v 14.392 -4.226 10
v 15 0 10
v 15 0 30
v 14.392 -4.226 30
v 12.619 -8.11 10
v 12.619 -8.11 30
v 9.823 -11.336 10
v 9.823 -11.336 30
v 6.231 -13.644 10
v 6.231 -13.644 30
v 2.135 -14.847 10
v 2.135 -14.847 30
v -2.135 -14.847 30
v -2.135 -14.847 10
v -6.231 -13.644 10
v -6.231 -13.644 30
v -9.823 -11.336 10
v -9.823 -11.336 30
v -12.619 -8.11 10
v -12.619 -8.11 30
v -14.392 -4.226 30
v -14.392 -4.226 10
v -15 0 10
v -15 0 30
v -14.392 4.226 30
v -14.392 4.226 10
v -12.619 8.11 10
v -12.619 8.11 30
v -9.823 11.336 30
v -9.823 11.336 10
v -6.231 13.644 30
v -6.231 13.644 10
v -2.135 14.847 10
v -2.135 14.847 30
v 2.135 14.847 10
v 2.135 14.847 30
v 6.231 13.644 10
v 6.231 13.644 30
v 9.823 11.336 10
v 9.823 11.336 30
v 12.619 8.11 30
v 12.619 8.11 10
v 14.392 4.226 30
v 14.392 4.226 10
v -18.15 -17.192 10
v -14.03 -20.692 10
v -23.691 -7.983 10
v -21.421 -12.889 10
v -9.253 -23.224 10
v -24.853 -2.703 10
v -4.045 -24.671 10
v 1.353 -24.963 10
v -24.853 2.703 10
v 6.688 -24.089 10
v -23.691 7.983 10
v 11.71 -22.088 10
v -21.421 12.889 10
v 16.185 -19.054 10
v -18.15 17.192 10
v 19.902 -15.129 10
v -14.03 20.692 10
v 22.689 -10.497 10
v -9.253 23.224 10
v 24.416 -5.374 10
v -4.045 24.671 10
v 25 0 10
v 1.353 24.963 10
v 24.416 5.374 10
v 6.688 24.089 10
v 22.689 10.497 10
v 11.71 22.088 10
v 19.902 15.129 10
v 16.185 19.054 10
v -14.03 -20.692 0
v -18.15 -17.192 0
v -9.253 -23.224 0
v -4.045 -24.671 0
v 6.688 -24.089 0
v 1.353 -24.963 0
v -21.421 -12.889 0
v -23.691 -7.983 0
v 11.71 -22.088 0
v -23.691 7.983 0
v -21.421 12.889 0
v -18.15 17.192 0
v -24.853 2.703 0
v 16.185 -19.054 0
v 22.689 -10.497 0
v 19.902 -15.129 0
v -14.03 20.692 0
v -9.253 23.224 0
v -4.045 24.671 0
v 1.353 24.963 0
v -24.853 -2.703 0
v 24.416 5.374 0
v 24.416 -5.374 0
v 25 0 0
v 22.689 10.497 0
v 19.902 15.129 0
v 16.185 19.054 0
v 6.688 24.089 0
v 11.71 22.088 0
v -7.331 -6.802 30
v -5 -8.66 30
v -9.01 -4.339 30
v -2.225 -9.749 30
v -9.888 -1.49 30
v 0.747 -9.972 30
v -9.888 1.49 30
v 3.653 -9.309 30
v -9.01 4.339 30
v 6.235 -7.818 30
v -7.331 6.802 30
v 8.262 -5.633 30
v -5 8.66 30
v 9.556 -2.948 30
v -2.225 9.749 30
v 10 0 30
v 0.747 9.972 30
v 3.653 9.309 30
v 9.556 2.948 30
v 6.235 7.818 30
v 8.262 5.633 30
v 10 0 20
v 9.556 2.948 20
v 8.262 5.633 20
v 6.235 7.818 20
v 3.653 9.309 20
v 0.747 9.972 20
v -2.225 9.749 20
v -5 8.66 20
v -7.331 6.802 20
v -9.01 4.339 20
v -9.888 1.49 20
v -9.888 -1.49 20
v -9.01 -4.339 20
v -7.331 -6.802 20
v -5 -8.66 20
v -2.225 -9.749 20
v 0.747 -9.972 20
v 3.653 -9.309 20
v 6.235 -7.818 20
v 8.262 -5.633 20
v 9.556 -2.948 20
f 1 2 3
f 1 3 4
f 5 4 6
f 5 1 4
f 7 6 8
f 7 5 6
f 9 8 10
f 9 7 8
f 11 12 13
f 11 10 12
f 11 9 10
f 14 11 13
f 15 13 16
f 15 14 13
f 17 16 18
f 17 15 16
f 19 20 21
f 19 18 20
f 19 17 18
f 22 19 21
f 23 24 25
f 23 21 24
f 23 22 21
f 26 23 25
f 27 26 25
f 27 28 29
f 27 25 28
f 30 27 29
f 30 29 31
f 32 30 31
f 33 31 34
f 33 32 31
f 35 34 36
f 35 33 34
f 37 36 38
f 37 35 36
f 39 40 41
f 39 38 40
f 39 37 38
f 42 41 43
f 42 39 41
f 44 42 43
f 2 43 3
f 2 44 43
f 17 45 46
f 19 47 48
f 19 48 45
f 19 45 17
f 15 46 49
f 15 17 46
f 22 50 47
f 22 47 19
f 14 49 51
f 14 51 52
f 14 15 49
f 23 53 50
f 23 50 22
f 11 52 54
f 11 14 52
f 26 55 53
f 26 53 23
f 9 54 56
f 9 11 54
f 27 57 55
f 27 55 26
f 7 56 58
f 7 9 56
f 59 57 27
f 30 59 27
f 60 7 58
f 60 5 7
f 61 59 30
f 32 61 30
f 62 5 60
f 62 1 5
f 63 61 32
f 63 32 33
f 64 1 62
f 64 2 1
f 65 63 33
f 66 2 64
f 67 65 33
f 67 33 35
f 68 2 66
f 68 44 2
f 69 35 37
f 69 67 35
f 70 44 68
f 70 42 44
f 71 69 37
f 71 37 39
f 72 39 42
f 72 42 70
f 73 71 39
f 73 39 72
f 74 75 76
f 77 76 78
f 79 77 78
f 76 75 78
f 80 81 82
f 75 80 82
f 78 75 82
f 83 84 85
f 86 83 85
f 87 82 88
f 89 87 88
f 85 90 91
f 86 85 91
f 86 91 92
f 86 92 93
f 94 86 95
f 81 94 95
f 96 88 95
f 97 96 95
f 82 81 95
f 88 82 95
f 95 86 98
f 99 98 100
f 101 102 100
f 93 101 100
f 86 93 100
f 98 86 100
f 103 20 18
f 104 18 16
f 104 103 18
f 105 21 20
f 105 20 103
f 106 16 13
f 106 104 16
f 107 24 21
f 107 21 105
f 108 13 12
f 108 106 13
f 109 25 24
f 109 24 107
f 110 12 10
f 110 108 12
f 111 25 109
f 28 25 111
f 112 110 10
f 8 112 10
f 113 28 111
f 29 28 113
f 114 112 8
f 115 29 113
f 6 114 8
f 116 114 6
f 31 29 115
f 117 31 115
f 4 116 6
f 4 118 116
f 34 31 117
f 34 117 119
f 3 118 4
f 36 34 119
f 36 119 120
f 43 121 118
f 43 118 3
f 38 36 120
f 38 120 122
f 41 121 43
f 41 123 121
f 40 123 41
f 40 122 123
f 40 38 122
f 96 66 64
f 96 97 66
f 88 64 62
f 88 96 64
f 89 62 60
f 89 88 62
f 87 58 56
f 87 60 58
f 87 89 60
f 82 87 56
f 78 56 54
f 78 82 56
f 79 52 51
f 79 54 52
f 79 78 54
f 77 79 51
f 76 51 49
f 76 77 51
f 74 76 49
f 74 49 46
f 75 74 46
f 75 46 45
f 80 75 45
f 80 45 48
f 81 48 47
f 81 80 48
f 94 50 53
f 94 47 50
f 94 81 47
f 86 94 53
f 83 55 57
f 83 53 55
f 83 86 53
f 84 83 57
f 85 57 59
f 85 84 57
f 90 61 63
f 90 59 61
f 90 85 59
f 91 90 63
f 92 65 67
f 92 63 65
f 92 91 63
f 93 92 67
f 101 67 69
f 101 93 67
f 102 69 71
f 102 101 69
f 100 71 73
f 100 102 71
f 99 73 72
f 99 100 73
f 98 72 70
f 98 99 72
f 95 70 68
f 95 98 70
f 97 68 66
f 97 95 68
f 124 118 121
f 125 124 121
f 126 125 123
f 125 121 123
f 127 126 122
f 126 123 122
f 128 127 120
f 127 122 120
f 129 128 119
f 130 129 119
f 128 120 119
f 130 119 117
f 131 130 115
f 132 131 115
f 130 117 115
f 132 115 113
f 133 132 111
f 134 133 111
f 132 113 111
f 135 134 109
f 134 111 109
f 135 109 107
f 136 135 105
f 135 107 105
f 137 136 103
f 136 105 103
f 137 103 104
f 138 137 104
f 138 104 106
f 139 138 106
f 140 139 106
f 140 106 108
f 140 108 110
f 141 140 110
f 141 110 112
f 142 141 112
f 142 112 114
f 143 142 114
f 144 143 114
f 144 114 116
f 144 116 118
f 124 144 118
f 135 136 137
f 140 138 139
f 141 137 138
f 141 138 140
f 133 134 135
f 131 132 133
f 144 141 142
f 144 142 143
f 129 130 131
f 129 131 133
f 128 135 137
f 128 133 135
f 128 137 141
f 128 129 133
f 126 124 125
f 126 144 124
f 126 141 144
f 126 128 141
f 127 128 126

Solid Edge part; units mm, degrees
sketch "Sketch1" plane through (0, 0, 0) normal (0, 0, 1) x (1, 0, 0)
  circle A0 centre (0, 0) radius 25
extrude "Protrusion1" add sketch "Sketch1" along normal blind 10
sketch "Sketch2" plane through (0, 0, 10) normal (0, 0, 1) x (1, 0, 0)
  circle A0 centre (0, 0) radius 15
extrude "ExtrudedProtrusion_2" add sketch "Sketch2" along normal blind 20
sketch "Sketch3" plane through (0, 0, 30) normal (0, 0, 1) x (1, 0, 0)
  circle A0 centre (0, 0) radius 10
extrude "ExtrudedCutout_1" cut sketch "Sketch3" against normal blind 10
cosmetic_thread "Thread1" size "Tr 20 x 4"
